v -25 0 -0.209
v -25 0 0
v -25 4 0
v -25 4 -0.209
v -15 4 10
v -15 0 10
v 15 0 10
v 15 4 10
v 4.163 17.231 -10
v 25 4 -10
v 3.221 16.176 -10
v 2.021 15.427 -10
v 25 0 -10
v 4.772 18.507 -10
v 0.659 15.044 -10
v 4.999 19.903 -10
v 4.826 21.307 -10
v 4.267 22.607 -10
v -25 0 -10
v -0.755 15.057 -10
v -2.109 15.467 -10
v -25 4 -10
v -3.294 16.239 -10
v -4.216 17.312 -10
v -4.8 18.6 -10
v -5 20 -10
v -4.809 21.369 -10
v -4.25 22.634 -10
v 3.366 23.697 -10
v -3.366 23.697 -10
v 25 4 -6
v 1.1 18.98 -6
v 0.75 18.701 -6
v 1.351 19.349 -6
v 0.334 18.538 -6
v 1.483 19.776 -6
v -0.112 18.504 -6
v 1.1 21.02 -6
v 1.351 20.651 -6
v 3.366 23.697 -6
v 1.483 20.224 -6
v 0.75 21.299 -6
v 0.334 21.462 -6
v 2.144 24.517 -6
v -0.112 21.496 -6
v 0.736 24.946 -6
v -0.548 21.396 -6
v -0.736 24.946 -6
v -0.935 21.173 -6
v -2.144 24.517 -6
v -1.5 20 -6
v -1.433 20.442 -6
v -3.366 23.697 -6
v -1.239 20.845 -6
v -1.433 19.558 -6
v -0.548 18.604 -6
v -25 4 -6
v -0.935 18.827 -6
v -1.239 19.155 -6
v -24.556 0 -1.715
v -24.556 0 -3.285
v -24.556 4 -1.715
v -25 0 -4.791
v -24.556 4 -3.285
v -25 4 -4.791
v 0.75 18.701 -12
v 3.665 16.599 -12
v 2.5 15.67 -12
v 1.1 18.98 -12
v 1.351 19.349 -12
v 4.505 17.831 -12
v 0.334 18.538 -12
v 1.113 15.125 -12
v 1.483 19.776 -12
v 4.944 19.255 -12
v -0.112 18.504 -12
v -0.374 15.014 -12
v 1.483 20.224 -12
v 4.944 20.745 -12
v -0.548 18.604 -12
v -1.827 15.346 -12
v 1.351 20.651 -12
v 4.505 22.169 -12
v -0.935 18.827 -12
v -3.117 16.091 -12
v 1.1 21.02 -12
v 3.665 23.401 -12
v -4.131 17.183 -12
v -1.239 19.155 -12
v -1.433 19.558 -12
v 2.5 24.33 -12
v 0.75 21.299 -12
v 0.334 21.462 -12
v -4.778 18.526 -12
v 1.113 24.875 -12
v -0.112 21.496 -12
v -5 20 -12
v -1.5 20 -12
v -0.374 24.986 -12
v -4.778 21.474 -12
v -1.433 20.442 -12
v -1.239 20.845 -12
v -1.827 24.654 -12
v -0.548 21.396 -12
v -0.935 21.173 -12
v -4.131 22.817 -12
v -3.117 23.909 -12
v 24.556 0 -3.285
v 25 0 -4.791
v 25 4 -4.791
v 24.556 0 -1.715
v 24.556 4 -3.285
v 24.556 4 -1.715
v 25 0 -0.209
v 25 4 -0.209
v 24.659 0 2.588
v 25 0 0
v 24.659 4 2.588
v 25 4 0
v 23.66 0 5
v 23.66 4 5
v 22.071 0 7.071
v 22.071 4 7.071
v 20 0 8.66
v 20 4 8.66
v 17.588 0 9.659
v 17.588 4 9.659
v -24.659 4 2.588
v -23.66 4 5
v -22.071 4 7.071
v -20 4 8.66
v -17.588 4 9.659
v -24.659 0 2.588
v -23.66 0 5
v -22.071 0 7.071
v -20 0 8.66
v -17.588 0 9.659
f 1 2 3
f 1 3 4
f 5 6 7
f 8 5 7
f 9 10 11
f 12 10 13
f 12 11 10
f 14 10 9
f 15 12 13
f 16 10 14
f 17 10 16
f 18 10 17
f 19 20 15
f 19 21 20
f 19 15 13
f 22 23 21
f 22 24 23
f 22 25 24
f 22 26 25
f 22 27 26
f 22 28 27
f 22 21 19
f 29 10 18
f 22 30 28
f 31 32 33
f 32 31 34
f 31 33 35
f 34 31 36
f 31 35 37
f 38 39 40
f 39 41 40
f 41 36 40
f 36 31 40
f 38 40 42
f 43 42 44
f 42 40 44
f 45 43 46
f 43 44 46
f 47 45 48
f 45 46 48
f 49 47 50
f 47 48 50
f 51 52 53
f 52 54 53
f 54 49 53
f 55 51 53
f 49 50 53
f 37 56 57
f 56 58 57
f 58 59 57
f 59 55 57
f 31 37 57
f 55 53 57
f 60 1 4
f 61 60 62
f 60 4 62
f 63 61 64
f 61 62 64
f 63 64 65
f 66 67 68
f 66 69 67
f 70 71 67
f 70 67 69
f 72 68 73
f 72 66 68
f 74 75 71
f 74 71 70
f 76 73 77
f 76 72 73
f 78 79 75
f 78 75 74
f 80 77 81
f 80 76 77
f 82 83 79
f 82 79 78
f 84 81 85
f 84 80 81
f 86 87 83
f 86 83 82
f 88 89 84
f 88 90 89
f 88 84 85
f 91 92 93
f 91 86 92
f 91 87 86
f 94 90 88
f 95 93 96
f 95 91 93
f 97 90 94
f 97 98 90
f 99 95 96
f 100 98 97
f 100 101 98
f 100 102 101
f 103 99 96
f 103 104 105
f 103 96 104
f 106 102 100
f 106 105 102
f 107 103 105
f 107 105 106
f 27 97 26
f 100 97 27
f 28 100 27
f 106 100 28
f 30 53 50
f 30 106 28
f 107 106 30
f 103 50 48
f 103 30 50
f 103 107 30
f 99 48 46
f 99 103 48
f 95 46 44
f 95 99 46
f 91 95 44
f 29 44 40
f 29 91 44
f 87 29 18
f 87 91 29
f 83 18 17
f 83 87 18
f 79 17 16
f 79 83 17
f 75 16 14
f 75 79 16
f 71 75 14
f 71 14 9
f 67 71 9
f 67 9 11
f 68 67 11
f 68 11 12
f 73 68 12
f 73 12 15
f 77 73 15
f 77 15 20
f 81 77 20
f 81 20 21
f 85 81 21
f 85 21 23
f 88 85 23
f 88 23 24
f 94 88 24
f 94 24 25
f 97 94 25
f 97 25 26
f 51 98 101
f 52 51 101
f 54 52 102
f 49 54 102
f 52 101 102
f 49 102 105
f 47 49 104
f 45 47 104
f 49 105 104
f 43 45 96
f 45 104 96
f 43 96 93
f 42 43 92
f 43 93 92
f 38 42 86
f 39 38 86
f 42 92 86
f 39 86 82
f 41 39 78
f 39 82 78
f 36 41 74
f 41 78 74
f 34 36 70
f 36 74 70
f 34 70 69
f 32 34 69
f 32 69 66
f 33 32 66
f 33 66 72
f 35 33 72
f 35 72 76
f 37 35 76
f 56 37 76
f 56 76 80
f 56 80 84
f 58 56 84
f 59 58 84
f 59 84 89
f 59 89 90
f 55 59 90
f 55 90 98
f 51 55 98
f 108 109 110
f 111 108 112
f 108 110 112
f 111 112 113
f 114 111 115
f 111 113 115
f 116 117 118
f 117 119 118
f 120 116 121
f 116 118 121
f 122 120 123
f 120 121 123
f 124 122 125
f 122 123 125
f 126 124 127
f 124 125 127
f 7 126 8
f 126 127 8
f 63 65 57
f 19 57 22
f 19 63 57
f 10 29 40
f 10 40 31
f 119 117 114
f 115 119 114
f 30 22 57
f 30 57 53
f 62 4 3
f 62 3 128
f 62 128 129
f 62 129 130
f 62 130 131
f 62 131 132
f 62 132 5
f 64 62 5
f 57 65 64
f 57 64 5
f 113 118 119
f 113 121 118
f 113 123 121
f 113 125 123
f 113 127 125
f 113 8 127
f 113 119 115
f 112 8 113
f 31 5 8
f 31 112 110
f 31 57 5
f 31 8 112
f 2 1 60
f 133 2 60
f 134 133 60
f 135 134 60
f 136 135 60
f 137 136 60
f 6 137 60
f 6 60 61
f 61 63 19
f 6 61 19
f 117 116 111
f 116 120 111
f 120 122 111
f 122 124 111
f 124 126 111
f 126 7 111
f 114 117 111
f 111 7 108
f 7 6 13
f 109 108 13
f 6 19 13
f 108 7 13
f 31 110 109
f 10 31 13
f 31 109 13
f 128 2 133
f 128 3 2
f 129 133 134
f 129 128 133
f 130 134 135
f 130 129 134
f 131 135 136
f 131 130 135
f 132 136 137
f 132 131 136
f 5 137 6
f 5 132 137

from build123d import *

# Parameters (mm, degrees)
CROQUIS1_W              = 50
CROQUIS1_H              = 20
SALIENTE_EXTRUIR1_DEPTH = 4
CROQUIS2_R              = 1.5
SALIENTE_EXTRUIR4_DEPTH = 4
SALIENTE_EXTRUIR5_START = 2
CROQUIS2_3_R            = 1.5
SALIENTE_EXTRUIR5_DEPTH = 2
CORTAR_EXTRUIR1_REACH   = 36.785
CROQUIS5_R              = 5.5
REDONDEO1_R             = 10


with BuildPart() as part:
    # Croquis1 → Saliente-Extruir1 (new body)
    with BuildSketch(Plane(origin=(0, 0, 0), x_dir=(1, 0, 0), z_dir=(0, 1, 0))):
        Rectangle(CROQUIS1_W, CROQUIS1_H)
    extrude(amount=SALIENTE_EXTRUIR1_DEPTH)

    # Croquis2 → Saliente-Extruir4 (add)
    with BuildSketch(Plane(origin=(0, 0, -10), x_dir=(-1, 0, 0), z_dir=(0, 0, -1))):
        with BuildLine():
            Line((-3.366172774, 23.69714496), (-25, 4))
            Line((-25, 4), (25, 4))
            Line((25, 4), (3.366172774, 23.69714496))
            ThreePointArc((3.366172774, 23.69714496), (0, 25), (-3.366172774, 23.69714496))
        make_face()
        with Locations((0, 20)):
            Circle(CROQUIS2_R, mode=Mode.SUBTRACT)
    extrude(amount=-SALIENTE_EXTRUIR4_DEPTH)

    # Croquis2<3> → Saliente-Extruir5 (add)
    with BuildSketch(Plane(origin=(0, 0, -10), x_dir=(-1, 0, 0), z_dir=(0, 0, -1)).offset(SALIENTE_EXTRUIR5_START)):
        with BuildLine():
            ThreePointArc((3.366172774, 23.69714496), (0, 25), (-3.366172774, 23.69714496))
            ThreePointArc((-3.366172774, 23.69714496), (-2.021031436, 15.426660746), (5, 20))
            ThreePointArc((5, 20), (4.573339254, 22.021031436), (3.366172774, 23.69714496))
        make_face()
        with Locations((0, 20)):
            Circle(CROQUIS2_3_R, mode=Mode.SUBTRACT)
    extrude(amount=-SALIENTE_EXTRUIR5_DEPTH)

    # Croquis5 → Cortar-Extruir1 (cut, up to next)
    with BuildSketch(Plane(origin=(0, 4, 0), x_dir=(1, 0, 0), z_dir=(0, 1, 0)), mode=Mode.PRIVATE) as cortar_extruir1_sk1:
        with Locations((-30, 2.5)):
            Circle(CROQUIS5_R)
    cortar_extruir1_tool1 = extrude(cortar_extruir1_sk1.sketch, amount=-CORTAR_EXTRUIR1_REACH, mode=Mode.PRIVATE) & part.part
    # Croquis5 → Cortar-Extruir1 (cut, up to next)
    with BuildSketch(Plane(origin=(0, 4, 0), x_dir=(1, 0, 0), z_dir=(0, 1, 0)), mode=Mode.PRIVATE) as cortar_extruir1_sk2:
        with Locations((30, 2.5)):
            Circle(CROQUIS5_R)
    cortar_extruir1_tool2 = extrude(cortar_extruir1_sk2.sketch, amount=-CORTAR_EXTRUIR1_REACH, mode=Mode.PRIVATE) & part.part
    add(cortar_extruir1_tool1.solids().sort_by_distance((-30, 4, -2.5))[0], mode=Mode.SUBTRACT)
    add(cortar_extruir1_tool2.solids().sort_by_distance((30, 4, -2.5))[0], mode=Mode.SUBTRACT)

    # Redondeo1
    redondeo1_edges = [part.edges().sort_by_distance(p)[0] for p in [
        (25, 2, 10),
        (-25, 2, 10),
    ]]
    fillet(redondeo1_edges, radius=REDONDEO1_R)


solid = part.part
